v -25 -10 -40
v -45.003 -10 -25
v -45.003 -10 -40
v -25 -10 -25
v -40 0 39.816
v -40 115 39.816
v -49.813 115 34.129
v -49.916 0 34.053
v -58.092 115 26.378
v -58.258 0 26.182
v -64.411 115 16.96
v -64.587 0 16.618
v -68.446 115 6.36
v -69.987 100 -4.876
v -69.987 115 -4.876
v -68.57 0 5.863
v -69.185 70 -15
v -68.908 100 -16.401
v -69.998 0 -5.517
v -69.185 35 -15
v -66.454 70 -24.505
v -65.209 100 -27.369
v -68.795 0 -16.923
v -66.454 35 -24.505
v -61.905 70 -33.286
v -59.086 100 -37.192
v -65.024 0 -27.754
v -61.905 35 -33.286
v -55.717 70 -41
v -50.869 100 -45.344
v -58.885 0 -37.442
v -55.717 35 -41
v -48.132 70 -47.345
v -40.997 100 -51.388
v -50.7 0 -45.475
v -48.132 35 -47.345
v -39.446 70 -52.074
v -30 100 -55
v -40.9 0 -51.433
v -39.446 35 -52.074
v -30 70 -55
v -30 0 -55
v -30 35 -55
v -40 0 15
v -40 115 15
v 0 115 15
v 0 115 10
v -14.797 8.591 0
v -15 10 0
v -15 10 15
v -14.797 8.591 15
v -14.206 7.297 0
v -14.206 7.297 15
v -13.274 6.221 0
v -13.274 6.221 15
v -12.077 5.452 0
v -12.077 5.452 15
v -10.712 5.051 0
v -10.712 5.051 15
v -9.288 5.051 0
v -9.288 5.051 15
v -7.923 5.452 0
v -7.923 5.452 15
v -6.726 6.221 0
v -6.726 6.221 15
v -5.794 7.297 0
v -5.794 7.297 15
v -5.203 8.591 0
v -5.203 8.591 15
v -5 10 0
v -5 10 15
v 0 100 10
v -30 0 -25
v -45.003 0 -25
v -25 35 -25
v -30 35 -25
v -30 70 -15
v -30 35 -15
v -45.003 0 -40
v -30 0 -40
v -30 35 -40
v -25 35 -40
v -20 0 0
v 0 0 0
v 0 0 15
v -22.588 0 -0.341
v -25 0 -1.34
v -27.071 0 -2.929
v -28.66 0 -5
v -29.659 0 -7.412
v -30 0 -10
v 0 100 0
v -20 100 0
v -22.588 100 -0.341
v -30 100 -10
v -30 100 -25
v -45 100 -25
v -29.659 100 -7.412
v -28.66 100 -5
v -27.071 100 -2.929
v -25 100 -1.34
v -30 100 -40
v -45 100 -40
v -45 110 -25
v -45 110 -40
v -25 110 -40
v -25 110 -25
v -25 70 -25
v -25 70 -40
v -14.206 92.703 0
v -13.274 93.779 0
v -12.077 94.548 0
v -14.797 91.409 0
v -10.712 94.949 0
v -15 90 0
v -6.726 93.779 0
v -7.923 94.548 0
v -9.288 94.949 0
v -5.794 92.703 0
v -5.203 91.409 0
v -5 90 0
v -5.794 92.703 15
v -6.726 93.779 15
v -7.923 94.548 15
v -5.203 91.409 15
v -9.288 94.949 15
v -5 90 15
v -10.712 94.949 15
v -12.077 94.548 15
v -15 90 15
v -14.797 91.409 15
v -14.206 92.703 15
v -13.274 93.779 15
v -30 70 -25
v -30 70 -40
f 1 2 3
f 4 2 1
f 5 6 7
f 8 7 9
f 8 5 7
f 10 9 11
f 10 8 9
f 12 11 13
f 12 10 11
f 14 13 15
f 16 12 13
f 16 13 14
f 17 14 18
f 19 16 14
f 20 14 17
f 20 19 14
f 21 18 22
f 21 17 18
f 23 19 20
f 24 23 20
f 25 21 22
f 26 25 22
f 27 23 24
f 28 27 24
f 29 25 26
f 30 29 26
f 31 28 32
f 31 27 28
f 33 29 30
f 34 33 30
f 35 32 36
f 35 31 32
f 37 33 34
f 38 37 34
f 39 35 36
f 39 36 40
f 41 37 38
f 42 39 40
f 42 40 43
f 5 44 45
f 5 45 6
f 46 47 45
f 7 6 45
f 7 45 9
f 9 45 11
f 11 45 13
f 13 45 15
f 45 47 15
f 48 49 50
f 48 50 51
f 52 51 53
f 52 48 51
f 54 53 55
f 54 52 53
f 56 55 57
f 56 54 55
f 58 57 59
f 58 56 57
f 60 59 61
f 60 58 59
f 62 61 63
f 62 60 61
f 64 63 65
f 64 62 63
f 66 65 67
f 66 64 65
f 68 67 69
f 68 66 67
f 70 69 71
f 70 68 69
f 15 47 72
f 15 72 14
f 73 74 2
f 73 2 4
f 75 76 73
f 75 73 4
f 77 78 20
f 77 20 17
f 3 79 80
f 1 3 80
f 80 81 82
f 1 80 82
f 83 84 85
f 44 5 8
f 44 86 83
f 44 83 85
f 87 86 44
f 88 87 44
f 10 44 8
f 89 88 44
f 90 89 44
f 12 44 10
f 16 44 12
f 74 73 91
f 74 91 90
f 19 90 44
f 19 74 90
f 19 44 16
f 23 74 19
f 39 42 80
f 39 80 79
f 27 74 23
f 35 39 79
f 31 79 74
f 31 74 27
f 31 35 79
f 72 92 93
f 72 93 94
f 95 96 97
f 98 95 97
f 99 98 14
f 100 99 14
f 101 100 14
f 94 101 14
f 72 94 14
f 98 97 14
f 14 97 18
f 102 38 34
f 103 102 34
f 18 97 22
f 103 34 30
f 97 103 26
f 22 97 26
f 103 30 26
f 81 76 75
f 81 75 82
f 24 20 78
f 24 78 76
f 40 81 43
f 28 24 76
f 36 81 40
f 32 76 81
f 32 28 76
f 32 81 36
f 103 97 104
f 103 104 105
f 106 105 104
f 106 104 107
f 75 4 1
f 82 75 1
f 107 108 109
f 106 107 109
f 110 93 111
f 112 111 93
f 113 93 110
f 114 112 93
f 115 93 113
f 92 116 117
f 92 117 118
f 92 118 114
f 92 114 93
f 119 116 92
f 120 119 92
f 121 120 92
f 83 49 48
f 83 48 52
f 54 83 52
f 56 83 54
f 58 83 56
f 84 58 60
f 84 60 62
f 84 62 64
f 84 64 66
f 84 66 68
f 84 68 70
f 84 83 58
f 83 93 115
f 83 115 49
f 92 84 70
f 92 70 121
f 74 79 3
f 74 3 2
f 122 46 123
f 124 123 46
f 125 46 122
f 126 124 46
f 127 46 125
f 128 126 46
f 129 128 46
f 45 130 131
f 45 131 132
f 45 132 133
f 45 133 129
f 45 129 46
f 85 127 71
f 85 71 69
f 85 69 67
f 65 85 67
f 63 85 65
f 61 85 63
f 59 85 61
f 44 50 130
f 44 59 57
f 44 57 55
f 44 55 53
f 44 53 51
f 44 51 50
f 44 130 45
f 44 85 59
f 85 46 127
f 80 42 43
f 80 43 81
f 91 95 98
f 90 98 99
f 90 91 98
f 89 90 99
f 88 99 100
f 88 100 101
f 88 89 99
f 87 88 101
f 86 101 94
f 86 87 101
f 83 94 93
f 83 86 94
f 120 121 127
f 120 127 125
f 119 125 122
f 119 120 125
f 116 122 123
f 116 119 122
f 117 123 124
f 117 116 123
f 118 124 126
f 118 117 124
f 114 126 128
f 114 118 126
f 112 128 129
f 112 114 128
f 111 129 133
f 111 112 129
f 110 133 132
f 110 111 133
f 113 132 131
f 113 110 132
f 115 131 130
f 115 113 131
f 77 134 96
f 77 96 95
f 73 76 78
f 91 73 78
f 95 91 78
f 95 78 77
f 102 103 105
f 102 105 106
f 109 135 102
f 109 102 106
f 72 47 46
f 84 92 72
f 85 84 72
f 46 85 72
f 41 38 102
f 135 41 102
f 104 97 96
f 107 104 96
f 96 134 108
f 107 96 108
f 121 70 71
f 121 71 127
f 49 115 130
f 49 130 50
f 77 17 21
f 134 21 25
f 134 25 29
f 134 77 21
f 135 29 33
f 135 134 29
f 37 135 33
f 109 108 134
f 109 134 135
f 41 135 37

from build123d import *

# Parameters (mm, degrees)
BOSS_EXTRUDE1_DEPTH = 115
SKETCH2_W           = 40
SKETCH2_H           = 35
CUT_EXTRUDE1_DEPTH  = 41
CUT_EXTRUDE2_REACH  = 41.816
SKETCH4_W           = 15
SKETCH4_H           = 45
SKETCH4_H_2         = 40
BOSS_EXTRUDE2_DEPTH = 5
CUT_EXTRUDE3_DEPTH  = 15
SKETCH7_W           = 15
SKETCH7_H           = 15
BOSS_EXTRUDE3_DEPTH = 10
SKETCH8_W           = 15.002545061
SKETCH8_H           = 15
BOSS_EXTRUDE4_DEPTH = 10


with BuildPart() as part:
    # Sketch1 → Boss-Extrude1 (new body)
    with BuildSketch(Plane(origin=(0, 0, 0), x_dir=(1, 0, 0), z_dir=(0, 1, 0))):
        with BuildLine():
            Line((0, 0), (0, -15))
            Line((0, -15), (-40, -15))
            Line((-40, -15), (-40, -39.815551805))
            ThreePointArc((-40, -39.815551805), (-69.724211568, 11.254514819), (-30, 55))
            Line((-30, 55), (-30, 10))
            ThreePointArc((-30, 10), (-27.071067812, 2.928932188), (-20, 0))
            Line((-20, 0), (0, 0))
        make_face()
    extrude(amount=BOSS_EXTRUDE1_DEPTH)

    # Sketch2 → Cut-Extrude1 (cut, through all)
    with BuildSketch(Plane(origin=(-30, 0, 0), x_dir=(0, 0, -1), z_dir=(1, 0, 0))):
        with Locations((35, 52.5)):
            Rectangle(SKETCH2_W, SKETCH2_H)
    extrude(amount=-CUT_EXTRUDE1_DEPTH, mode=Mode.SUBTRACT)

    # Sketch3 → Cut-Extrude2 (cut, up to next)
    with BuildSketch(Plane(origin=(0, 0, 0), x_dir=(-1, 0, 0), z_dir=(0, 0, -1)), mode=Mode.PRIVATE) as cut_extrude2_sk1:
        with BuildLine():
            Line((15, 90), (15, 10))
            ThreePointArc((15, 10), (10, 5), (5, 10))
            Line((5, 10), (5, 90))
            ThreePointArc((5, 90), (10, 95), (15, 90))
        make_face()
    cut_extrude2_tool1 = extrude(cut_extrude2_sk1.sketch, amount=-CUT_EXTRUDE2_REACH, mode=Mode.PRIVATE) & part.part
    add(cut_extrude2_tool1.solids().sort_by_distance((-10, 50, 0))[0], mode=Mode.SUBTRACT)

    # Sketch4 → Boss-Extrude2 (add)
    with BuildSketch(Plane(origin=(-30, 0, 0), x_dir=(0, 0, -1), z_dir=(1, 0, 0))):
        with Locations((32.5, 12.5)):
            Rectangle(SKETCH4_W, SKETCH4_H)
        with Locations((32.5, 90)):
            Rectangle(SKETCH4_W, SKETCH4_H_2)
    extrude(amount=BOSS_EXTRUDE2_DEPTH)

    # Sketch6 → Cut-Extrude3 (cut)
    with BuildSketch(Plane(origin=(0, 115, 0), x_dir=(1, 0, 0), z_dir=(0, 1, 0))):
        with BuildLine():
            Line((0, -10), (-69.987139252, 4.87622568))
            ThreePointArc((-69.987139252, 4.87622568), (-59.085961763, 37.191731616), (-30, 55))
            Line((-30, 55), (-30, 10))
            ThreePointArc((-30, 10), (-27.071067812, 2.928932188), (-20, 0))
            Line((-20, 0), (0, 0))
            Line((0, 0), (0, -10))
        make_face()
    extrude(amount=-CUT_EXTRUDE3_DEPTH, mode=Mode.SUBTRACT)

    # Sketch7 → Boss-Extrude3 (add)
    with BuildSketch(Plane(origin=(0, 100, 0), x_dir=(1, 0, 0), z_dir=(0, 1, 0))):
        with Locations((-37.5, 32.5)):
            Rectangle(SKETCH7_W, SKETCH7_H)
    extrude(amount=BOSS_EXTRUDE3_DEPTH)

    # Sketch8 → Boss-Extrude4 (add)
    with BuildSketch(Plane.XZ):
        with Locations((-37.501272531, -32.5)):
            Rectangle(SKETCH8_W, SKETCH8_H)
    extrude(amount=BOSS_EXTRUDE4_DEPTH)


solid = part.part
